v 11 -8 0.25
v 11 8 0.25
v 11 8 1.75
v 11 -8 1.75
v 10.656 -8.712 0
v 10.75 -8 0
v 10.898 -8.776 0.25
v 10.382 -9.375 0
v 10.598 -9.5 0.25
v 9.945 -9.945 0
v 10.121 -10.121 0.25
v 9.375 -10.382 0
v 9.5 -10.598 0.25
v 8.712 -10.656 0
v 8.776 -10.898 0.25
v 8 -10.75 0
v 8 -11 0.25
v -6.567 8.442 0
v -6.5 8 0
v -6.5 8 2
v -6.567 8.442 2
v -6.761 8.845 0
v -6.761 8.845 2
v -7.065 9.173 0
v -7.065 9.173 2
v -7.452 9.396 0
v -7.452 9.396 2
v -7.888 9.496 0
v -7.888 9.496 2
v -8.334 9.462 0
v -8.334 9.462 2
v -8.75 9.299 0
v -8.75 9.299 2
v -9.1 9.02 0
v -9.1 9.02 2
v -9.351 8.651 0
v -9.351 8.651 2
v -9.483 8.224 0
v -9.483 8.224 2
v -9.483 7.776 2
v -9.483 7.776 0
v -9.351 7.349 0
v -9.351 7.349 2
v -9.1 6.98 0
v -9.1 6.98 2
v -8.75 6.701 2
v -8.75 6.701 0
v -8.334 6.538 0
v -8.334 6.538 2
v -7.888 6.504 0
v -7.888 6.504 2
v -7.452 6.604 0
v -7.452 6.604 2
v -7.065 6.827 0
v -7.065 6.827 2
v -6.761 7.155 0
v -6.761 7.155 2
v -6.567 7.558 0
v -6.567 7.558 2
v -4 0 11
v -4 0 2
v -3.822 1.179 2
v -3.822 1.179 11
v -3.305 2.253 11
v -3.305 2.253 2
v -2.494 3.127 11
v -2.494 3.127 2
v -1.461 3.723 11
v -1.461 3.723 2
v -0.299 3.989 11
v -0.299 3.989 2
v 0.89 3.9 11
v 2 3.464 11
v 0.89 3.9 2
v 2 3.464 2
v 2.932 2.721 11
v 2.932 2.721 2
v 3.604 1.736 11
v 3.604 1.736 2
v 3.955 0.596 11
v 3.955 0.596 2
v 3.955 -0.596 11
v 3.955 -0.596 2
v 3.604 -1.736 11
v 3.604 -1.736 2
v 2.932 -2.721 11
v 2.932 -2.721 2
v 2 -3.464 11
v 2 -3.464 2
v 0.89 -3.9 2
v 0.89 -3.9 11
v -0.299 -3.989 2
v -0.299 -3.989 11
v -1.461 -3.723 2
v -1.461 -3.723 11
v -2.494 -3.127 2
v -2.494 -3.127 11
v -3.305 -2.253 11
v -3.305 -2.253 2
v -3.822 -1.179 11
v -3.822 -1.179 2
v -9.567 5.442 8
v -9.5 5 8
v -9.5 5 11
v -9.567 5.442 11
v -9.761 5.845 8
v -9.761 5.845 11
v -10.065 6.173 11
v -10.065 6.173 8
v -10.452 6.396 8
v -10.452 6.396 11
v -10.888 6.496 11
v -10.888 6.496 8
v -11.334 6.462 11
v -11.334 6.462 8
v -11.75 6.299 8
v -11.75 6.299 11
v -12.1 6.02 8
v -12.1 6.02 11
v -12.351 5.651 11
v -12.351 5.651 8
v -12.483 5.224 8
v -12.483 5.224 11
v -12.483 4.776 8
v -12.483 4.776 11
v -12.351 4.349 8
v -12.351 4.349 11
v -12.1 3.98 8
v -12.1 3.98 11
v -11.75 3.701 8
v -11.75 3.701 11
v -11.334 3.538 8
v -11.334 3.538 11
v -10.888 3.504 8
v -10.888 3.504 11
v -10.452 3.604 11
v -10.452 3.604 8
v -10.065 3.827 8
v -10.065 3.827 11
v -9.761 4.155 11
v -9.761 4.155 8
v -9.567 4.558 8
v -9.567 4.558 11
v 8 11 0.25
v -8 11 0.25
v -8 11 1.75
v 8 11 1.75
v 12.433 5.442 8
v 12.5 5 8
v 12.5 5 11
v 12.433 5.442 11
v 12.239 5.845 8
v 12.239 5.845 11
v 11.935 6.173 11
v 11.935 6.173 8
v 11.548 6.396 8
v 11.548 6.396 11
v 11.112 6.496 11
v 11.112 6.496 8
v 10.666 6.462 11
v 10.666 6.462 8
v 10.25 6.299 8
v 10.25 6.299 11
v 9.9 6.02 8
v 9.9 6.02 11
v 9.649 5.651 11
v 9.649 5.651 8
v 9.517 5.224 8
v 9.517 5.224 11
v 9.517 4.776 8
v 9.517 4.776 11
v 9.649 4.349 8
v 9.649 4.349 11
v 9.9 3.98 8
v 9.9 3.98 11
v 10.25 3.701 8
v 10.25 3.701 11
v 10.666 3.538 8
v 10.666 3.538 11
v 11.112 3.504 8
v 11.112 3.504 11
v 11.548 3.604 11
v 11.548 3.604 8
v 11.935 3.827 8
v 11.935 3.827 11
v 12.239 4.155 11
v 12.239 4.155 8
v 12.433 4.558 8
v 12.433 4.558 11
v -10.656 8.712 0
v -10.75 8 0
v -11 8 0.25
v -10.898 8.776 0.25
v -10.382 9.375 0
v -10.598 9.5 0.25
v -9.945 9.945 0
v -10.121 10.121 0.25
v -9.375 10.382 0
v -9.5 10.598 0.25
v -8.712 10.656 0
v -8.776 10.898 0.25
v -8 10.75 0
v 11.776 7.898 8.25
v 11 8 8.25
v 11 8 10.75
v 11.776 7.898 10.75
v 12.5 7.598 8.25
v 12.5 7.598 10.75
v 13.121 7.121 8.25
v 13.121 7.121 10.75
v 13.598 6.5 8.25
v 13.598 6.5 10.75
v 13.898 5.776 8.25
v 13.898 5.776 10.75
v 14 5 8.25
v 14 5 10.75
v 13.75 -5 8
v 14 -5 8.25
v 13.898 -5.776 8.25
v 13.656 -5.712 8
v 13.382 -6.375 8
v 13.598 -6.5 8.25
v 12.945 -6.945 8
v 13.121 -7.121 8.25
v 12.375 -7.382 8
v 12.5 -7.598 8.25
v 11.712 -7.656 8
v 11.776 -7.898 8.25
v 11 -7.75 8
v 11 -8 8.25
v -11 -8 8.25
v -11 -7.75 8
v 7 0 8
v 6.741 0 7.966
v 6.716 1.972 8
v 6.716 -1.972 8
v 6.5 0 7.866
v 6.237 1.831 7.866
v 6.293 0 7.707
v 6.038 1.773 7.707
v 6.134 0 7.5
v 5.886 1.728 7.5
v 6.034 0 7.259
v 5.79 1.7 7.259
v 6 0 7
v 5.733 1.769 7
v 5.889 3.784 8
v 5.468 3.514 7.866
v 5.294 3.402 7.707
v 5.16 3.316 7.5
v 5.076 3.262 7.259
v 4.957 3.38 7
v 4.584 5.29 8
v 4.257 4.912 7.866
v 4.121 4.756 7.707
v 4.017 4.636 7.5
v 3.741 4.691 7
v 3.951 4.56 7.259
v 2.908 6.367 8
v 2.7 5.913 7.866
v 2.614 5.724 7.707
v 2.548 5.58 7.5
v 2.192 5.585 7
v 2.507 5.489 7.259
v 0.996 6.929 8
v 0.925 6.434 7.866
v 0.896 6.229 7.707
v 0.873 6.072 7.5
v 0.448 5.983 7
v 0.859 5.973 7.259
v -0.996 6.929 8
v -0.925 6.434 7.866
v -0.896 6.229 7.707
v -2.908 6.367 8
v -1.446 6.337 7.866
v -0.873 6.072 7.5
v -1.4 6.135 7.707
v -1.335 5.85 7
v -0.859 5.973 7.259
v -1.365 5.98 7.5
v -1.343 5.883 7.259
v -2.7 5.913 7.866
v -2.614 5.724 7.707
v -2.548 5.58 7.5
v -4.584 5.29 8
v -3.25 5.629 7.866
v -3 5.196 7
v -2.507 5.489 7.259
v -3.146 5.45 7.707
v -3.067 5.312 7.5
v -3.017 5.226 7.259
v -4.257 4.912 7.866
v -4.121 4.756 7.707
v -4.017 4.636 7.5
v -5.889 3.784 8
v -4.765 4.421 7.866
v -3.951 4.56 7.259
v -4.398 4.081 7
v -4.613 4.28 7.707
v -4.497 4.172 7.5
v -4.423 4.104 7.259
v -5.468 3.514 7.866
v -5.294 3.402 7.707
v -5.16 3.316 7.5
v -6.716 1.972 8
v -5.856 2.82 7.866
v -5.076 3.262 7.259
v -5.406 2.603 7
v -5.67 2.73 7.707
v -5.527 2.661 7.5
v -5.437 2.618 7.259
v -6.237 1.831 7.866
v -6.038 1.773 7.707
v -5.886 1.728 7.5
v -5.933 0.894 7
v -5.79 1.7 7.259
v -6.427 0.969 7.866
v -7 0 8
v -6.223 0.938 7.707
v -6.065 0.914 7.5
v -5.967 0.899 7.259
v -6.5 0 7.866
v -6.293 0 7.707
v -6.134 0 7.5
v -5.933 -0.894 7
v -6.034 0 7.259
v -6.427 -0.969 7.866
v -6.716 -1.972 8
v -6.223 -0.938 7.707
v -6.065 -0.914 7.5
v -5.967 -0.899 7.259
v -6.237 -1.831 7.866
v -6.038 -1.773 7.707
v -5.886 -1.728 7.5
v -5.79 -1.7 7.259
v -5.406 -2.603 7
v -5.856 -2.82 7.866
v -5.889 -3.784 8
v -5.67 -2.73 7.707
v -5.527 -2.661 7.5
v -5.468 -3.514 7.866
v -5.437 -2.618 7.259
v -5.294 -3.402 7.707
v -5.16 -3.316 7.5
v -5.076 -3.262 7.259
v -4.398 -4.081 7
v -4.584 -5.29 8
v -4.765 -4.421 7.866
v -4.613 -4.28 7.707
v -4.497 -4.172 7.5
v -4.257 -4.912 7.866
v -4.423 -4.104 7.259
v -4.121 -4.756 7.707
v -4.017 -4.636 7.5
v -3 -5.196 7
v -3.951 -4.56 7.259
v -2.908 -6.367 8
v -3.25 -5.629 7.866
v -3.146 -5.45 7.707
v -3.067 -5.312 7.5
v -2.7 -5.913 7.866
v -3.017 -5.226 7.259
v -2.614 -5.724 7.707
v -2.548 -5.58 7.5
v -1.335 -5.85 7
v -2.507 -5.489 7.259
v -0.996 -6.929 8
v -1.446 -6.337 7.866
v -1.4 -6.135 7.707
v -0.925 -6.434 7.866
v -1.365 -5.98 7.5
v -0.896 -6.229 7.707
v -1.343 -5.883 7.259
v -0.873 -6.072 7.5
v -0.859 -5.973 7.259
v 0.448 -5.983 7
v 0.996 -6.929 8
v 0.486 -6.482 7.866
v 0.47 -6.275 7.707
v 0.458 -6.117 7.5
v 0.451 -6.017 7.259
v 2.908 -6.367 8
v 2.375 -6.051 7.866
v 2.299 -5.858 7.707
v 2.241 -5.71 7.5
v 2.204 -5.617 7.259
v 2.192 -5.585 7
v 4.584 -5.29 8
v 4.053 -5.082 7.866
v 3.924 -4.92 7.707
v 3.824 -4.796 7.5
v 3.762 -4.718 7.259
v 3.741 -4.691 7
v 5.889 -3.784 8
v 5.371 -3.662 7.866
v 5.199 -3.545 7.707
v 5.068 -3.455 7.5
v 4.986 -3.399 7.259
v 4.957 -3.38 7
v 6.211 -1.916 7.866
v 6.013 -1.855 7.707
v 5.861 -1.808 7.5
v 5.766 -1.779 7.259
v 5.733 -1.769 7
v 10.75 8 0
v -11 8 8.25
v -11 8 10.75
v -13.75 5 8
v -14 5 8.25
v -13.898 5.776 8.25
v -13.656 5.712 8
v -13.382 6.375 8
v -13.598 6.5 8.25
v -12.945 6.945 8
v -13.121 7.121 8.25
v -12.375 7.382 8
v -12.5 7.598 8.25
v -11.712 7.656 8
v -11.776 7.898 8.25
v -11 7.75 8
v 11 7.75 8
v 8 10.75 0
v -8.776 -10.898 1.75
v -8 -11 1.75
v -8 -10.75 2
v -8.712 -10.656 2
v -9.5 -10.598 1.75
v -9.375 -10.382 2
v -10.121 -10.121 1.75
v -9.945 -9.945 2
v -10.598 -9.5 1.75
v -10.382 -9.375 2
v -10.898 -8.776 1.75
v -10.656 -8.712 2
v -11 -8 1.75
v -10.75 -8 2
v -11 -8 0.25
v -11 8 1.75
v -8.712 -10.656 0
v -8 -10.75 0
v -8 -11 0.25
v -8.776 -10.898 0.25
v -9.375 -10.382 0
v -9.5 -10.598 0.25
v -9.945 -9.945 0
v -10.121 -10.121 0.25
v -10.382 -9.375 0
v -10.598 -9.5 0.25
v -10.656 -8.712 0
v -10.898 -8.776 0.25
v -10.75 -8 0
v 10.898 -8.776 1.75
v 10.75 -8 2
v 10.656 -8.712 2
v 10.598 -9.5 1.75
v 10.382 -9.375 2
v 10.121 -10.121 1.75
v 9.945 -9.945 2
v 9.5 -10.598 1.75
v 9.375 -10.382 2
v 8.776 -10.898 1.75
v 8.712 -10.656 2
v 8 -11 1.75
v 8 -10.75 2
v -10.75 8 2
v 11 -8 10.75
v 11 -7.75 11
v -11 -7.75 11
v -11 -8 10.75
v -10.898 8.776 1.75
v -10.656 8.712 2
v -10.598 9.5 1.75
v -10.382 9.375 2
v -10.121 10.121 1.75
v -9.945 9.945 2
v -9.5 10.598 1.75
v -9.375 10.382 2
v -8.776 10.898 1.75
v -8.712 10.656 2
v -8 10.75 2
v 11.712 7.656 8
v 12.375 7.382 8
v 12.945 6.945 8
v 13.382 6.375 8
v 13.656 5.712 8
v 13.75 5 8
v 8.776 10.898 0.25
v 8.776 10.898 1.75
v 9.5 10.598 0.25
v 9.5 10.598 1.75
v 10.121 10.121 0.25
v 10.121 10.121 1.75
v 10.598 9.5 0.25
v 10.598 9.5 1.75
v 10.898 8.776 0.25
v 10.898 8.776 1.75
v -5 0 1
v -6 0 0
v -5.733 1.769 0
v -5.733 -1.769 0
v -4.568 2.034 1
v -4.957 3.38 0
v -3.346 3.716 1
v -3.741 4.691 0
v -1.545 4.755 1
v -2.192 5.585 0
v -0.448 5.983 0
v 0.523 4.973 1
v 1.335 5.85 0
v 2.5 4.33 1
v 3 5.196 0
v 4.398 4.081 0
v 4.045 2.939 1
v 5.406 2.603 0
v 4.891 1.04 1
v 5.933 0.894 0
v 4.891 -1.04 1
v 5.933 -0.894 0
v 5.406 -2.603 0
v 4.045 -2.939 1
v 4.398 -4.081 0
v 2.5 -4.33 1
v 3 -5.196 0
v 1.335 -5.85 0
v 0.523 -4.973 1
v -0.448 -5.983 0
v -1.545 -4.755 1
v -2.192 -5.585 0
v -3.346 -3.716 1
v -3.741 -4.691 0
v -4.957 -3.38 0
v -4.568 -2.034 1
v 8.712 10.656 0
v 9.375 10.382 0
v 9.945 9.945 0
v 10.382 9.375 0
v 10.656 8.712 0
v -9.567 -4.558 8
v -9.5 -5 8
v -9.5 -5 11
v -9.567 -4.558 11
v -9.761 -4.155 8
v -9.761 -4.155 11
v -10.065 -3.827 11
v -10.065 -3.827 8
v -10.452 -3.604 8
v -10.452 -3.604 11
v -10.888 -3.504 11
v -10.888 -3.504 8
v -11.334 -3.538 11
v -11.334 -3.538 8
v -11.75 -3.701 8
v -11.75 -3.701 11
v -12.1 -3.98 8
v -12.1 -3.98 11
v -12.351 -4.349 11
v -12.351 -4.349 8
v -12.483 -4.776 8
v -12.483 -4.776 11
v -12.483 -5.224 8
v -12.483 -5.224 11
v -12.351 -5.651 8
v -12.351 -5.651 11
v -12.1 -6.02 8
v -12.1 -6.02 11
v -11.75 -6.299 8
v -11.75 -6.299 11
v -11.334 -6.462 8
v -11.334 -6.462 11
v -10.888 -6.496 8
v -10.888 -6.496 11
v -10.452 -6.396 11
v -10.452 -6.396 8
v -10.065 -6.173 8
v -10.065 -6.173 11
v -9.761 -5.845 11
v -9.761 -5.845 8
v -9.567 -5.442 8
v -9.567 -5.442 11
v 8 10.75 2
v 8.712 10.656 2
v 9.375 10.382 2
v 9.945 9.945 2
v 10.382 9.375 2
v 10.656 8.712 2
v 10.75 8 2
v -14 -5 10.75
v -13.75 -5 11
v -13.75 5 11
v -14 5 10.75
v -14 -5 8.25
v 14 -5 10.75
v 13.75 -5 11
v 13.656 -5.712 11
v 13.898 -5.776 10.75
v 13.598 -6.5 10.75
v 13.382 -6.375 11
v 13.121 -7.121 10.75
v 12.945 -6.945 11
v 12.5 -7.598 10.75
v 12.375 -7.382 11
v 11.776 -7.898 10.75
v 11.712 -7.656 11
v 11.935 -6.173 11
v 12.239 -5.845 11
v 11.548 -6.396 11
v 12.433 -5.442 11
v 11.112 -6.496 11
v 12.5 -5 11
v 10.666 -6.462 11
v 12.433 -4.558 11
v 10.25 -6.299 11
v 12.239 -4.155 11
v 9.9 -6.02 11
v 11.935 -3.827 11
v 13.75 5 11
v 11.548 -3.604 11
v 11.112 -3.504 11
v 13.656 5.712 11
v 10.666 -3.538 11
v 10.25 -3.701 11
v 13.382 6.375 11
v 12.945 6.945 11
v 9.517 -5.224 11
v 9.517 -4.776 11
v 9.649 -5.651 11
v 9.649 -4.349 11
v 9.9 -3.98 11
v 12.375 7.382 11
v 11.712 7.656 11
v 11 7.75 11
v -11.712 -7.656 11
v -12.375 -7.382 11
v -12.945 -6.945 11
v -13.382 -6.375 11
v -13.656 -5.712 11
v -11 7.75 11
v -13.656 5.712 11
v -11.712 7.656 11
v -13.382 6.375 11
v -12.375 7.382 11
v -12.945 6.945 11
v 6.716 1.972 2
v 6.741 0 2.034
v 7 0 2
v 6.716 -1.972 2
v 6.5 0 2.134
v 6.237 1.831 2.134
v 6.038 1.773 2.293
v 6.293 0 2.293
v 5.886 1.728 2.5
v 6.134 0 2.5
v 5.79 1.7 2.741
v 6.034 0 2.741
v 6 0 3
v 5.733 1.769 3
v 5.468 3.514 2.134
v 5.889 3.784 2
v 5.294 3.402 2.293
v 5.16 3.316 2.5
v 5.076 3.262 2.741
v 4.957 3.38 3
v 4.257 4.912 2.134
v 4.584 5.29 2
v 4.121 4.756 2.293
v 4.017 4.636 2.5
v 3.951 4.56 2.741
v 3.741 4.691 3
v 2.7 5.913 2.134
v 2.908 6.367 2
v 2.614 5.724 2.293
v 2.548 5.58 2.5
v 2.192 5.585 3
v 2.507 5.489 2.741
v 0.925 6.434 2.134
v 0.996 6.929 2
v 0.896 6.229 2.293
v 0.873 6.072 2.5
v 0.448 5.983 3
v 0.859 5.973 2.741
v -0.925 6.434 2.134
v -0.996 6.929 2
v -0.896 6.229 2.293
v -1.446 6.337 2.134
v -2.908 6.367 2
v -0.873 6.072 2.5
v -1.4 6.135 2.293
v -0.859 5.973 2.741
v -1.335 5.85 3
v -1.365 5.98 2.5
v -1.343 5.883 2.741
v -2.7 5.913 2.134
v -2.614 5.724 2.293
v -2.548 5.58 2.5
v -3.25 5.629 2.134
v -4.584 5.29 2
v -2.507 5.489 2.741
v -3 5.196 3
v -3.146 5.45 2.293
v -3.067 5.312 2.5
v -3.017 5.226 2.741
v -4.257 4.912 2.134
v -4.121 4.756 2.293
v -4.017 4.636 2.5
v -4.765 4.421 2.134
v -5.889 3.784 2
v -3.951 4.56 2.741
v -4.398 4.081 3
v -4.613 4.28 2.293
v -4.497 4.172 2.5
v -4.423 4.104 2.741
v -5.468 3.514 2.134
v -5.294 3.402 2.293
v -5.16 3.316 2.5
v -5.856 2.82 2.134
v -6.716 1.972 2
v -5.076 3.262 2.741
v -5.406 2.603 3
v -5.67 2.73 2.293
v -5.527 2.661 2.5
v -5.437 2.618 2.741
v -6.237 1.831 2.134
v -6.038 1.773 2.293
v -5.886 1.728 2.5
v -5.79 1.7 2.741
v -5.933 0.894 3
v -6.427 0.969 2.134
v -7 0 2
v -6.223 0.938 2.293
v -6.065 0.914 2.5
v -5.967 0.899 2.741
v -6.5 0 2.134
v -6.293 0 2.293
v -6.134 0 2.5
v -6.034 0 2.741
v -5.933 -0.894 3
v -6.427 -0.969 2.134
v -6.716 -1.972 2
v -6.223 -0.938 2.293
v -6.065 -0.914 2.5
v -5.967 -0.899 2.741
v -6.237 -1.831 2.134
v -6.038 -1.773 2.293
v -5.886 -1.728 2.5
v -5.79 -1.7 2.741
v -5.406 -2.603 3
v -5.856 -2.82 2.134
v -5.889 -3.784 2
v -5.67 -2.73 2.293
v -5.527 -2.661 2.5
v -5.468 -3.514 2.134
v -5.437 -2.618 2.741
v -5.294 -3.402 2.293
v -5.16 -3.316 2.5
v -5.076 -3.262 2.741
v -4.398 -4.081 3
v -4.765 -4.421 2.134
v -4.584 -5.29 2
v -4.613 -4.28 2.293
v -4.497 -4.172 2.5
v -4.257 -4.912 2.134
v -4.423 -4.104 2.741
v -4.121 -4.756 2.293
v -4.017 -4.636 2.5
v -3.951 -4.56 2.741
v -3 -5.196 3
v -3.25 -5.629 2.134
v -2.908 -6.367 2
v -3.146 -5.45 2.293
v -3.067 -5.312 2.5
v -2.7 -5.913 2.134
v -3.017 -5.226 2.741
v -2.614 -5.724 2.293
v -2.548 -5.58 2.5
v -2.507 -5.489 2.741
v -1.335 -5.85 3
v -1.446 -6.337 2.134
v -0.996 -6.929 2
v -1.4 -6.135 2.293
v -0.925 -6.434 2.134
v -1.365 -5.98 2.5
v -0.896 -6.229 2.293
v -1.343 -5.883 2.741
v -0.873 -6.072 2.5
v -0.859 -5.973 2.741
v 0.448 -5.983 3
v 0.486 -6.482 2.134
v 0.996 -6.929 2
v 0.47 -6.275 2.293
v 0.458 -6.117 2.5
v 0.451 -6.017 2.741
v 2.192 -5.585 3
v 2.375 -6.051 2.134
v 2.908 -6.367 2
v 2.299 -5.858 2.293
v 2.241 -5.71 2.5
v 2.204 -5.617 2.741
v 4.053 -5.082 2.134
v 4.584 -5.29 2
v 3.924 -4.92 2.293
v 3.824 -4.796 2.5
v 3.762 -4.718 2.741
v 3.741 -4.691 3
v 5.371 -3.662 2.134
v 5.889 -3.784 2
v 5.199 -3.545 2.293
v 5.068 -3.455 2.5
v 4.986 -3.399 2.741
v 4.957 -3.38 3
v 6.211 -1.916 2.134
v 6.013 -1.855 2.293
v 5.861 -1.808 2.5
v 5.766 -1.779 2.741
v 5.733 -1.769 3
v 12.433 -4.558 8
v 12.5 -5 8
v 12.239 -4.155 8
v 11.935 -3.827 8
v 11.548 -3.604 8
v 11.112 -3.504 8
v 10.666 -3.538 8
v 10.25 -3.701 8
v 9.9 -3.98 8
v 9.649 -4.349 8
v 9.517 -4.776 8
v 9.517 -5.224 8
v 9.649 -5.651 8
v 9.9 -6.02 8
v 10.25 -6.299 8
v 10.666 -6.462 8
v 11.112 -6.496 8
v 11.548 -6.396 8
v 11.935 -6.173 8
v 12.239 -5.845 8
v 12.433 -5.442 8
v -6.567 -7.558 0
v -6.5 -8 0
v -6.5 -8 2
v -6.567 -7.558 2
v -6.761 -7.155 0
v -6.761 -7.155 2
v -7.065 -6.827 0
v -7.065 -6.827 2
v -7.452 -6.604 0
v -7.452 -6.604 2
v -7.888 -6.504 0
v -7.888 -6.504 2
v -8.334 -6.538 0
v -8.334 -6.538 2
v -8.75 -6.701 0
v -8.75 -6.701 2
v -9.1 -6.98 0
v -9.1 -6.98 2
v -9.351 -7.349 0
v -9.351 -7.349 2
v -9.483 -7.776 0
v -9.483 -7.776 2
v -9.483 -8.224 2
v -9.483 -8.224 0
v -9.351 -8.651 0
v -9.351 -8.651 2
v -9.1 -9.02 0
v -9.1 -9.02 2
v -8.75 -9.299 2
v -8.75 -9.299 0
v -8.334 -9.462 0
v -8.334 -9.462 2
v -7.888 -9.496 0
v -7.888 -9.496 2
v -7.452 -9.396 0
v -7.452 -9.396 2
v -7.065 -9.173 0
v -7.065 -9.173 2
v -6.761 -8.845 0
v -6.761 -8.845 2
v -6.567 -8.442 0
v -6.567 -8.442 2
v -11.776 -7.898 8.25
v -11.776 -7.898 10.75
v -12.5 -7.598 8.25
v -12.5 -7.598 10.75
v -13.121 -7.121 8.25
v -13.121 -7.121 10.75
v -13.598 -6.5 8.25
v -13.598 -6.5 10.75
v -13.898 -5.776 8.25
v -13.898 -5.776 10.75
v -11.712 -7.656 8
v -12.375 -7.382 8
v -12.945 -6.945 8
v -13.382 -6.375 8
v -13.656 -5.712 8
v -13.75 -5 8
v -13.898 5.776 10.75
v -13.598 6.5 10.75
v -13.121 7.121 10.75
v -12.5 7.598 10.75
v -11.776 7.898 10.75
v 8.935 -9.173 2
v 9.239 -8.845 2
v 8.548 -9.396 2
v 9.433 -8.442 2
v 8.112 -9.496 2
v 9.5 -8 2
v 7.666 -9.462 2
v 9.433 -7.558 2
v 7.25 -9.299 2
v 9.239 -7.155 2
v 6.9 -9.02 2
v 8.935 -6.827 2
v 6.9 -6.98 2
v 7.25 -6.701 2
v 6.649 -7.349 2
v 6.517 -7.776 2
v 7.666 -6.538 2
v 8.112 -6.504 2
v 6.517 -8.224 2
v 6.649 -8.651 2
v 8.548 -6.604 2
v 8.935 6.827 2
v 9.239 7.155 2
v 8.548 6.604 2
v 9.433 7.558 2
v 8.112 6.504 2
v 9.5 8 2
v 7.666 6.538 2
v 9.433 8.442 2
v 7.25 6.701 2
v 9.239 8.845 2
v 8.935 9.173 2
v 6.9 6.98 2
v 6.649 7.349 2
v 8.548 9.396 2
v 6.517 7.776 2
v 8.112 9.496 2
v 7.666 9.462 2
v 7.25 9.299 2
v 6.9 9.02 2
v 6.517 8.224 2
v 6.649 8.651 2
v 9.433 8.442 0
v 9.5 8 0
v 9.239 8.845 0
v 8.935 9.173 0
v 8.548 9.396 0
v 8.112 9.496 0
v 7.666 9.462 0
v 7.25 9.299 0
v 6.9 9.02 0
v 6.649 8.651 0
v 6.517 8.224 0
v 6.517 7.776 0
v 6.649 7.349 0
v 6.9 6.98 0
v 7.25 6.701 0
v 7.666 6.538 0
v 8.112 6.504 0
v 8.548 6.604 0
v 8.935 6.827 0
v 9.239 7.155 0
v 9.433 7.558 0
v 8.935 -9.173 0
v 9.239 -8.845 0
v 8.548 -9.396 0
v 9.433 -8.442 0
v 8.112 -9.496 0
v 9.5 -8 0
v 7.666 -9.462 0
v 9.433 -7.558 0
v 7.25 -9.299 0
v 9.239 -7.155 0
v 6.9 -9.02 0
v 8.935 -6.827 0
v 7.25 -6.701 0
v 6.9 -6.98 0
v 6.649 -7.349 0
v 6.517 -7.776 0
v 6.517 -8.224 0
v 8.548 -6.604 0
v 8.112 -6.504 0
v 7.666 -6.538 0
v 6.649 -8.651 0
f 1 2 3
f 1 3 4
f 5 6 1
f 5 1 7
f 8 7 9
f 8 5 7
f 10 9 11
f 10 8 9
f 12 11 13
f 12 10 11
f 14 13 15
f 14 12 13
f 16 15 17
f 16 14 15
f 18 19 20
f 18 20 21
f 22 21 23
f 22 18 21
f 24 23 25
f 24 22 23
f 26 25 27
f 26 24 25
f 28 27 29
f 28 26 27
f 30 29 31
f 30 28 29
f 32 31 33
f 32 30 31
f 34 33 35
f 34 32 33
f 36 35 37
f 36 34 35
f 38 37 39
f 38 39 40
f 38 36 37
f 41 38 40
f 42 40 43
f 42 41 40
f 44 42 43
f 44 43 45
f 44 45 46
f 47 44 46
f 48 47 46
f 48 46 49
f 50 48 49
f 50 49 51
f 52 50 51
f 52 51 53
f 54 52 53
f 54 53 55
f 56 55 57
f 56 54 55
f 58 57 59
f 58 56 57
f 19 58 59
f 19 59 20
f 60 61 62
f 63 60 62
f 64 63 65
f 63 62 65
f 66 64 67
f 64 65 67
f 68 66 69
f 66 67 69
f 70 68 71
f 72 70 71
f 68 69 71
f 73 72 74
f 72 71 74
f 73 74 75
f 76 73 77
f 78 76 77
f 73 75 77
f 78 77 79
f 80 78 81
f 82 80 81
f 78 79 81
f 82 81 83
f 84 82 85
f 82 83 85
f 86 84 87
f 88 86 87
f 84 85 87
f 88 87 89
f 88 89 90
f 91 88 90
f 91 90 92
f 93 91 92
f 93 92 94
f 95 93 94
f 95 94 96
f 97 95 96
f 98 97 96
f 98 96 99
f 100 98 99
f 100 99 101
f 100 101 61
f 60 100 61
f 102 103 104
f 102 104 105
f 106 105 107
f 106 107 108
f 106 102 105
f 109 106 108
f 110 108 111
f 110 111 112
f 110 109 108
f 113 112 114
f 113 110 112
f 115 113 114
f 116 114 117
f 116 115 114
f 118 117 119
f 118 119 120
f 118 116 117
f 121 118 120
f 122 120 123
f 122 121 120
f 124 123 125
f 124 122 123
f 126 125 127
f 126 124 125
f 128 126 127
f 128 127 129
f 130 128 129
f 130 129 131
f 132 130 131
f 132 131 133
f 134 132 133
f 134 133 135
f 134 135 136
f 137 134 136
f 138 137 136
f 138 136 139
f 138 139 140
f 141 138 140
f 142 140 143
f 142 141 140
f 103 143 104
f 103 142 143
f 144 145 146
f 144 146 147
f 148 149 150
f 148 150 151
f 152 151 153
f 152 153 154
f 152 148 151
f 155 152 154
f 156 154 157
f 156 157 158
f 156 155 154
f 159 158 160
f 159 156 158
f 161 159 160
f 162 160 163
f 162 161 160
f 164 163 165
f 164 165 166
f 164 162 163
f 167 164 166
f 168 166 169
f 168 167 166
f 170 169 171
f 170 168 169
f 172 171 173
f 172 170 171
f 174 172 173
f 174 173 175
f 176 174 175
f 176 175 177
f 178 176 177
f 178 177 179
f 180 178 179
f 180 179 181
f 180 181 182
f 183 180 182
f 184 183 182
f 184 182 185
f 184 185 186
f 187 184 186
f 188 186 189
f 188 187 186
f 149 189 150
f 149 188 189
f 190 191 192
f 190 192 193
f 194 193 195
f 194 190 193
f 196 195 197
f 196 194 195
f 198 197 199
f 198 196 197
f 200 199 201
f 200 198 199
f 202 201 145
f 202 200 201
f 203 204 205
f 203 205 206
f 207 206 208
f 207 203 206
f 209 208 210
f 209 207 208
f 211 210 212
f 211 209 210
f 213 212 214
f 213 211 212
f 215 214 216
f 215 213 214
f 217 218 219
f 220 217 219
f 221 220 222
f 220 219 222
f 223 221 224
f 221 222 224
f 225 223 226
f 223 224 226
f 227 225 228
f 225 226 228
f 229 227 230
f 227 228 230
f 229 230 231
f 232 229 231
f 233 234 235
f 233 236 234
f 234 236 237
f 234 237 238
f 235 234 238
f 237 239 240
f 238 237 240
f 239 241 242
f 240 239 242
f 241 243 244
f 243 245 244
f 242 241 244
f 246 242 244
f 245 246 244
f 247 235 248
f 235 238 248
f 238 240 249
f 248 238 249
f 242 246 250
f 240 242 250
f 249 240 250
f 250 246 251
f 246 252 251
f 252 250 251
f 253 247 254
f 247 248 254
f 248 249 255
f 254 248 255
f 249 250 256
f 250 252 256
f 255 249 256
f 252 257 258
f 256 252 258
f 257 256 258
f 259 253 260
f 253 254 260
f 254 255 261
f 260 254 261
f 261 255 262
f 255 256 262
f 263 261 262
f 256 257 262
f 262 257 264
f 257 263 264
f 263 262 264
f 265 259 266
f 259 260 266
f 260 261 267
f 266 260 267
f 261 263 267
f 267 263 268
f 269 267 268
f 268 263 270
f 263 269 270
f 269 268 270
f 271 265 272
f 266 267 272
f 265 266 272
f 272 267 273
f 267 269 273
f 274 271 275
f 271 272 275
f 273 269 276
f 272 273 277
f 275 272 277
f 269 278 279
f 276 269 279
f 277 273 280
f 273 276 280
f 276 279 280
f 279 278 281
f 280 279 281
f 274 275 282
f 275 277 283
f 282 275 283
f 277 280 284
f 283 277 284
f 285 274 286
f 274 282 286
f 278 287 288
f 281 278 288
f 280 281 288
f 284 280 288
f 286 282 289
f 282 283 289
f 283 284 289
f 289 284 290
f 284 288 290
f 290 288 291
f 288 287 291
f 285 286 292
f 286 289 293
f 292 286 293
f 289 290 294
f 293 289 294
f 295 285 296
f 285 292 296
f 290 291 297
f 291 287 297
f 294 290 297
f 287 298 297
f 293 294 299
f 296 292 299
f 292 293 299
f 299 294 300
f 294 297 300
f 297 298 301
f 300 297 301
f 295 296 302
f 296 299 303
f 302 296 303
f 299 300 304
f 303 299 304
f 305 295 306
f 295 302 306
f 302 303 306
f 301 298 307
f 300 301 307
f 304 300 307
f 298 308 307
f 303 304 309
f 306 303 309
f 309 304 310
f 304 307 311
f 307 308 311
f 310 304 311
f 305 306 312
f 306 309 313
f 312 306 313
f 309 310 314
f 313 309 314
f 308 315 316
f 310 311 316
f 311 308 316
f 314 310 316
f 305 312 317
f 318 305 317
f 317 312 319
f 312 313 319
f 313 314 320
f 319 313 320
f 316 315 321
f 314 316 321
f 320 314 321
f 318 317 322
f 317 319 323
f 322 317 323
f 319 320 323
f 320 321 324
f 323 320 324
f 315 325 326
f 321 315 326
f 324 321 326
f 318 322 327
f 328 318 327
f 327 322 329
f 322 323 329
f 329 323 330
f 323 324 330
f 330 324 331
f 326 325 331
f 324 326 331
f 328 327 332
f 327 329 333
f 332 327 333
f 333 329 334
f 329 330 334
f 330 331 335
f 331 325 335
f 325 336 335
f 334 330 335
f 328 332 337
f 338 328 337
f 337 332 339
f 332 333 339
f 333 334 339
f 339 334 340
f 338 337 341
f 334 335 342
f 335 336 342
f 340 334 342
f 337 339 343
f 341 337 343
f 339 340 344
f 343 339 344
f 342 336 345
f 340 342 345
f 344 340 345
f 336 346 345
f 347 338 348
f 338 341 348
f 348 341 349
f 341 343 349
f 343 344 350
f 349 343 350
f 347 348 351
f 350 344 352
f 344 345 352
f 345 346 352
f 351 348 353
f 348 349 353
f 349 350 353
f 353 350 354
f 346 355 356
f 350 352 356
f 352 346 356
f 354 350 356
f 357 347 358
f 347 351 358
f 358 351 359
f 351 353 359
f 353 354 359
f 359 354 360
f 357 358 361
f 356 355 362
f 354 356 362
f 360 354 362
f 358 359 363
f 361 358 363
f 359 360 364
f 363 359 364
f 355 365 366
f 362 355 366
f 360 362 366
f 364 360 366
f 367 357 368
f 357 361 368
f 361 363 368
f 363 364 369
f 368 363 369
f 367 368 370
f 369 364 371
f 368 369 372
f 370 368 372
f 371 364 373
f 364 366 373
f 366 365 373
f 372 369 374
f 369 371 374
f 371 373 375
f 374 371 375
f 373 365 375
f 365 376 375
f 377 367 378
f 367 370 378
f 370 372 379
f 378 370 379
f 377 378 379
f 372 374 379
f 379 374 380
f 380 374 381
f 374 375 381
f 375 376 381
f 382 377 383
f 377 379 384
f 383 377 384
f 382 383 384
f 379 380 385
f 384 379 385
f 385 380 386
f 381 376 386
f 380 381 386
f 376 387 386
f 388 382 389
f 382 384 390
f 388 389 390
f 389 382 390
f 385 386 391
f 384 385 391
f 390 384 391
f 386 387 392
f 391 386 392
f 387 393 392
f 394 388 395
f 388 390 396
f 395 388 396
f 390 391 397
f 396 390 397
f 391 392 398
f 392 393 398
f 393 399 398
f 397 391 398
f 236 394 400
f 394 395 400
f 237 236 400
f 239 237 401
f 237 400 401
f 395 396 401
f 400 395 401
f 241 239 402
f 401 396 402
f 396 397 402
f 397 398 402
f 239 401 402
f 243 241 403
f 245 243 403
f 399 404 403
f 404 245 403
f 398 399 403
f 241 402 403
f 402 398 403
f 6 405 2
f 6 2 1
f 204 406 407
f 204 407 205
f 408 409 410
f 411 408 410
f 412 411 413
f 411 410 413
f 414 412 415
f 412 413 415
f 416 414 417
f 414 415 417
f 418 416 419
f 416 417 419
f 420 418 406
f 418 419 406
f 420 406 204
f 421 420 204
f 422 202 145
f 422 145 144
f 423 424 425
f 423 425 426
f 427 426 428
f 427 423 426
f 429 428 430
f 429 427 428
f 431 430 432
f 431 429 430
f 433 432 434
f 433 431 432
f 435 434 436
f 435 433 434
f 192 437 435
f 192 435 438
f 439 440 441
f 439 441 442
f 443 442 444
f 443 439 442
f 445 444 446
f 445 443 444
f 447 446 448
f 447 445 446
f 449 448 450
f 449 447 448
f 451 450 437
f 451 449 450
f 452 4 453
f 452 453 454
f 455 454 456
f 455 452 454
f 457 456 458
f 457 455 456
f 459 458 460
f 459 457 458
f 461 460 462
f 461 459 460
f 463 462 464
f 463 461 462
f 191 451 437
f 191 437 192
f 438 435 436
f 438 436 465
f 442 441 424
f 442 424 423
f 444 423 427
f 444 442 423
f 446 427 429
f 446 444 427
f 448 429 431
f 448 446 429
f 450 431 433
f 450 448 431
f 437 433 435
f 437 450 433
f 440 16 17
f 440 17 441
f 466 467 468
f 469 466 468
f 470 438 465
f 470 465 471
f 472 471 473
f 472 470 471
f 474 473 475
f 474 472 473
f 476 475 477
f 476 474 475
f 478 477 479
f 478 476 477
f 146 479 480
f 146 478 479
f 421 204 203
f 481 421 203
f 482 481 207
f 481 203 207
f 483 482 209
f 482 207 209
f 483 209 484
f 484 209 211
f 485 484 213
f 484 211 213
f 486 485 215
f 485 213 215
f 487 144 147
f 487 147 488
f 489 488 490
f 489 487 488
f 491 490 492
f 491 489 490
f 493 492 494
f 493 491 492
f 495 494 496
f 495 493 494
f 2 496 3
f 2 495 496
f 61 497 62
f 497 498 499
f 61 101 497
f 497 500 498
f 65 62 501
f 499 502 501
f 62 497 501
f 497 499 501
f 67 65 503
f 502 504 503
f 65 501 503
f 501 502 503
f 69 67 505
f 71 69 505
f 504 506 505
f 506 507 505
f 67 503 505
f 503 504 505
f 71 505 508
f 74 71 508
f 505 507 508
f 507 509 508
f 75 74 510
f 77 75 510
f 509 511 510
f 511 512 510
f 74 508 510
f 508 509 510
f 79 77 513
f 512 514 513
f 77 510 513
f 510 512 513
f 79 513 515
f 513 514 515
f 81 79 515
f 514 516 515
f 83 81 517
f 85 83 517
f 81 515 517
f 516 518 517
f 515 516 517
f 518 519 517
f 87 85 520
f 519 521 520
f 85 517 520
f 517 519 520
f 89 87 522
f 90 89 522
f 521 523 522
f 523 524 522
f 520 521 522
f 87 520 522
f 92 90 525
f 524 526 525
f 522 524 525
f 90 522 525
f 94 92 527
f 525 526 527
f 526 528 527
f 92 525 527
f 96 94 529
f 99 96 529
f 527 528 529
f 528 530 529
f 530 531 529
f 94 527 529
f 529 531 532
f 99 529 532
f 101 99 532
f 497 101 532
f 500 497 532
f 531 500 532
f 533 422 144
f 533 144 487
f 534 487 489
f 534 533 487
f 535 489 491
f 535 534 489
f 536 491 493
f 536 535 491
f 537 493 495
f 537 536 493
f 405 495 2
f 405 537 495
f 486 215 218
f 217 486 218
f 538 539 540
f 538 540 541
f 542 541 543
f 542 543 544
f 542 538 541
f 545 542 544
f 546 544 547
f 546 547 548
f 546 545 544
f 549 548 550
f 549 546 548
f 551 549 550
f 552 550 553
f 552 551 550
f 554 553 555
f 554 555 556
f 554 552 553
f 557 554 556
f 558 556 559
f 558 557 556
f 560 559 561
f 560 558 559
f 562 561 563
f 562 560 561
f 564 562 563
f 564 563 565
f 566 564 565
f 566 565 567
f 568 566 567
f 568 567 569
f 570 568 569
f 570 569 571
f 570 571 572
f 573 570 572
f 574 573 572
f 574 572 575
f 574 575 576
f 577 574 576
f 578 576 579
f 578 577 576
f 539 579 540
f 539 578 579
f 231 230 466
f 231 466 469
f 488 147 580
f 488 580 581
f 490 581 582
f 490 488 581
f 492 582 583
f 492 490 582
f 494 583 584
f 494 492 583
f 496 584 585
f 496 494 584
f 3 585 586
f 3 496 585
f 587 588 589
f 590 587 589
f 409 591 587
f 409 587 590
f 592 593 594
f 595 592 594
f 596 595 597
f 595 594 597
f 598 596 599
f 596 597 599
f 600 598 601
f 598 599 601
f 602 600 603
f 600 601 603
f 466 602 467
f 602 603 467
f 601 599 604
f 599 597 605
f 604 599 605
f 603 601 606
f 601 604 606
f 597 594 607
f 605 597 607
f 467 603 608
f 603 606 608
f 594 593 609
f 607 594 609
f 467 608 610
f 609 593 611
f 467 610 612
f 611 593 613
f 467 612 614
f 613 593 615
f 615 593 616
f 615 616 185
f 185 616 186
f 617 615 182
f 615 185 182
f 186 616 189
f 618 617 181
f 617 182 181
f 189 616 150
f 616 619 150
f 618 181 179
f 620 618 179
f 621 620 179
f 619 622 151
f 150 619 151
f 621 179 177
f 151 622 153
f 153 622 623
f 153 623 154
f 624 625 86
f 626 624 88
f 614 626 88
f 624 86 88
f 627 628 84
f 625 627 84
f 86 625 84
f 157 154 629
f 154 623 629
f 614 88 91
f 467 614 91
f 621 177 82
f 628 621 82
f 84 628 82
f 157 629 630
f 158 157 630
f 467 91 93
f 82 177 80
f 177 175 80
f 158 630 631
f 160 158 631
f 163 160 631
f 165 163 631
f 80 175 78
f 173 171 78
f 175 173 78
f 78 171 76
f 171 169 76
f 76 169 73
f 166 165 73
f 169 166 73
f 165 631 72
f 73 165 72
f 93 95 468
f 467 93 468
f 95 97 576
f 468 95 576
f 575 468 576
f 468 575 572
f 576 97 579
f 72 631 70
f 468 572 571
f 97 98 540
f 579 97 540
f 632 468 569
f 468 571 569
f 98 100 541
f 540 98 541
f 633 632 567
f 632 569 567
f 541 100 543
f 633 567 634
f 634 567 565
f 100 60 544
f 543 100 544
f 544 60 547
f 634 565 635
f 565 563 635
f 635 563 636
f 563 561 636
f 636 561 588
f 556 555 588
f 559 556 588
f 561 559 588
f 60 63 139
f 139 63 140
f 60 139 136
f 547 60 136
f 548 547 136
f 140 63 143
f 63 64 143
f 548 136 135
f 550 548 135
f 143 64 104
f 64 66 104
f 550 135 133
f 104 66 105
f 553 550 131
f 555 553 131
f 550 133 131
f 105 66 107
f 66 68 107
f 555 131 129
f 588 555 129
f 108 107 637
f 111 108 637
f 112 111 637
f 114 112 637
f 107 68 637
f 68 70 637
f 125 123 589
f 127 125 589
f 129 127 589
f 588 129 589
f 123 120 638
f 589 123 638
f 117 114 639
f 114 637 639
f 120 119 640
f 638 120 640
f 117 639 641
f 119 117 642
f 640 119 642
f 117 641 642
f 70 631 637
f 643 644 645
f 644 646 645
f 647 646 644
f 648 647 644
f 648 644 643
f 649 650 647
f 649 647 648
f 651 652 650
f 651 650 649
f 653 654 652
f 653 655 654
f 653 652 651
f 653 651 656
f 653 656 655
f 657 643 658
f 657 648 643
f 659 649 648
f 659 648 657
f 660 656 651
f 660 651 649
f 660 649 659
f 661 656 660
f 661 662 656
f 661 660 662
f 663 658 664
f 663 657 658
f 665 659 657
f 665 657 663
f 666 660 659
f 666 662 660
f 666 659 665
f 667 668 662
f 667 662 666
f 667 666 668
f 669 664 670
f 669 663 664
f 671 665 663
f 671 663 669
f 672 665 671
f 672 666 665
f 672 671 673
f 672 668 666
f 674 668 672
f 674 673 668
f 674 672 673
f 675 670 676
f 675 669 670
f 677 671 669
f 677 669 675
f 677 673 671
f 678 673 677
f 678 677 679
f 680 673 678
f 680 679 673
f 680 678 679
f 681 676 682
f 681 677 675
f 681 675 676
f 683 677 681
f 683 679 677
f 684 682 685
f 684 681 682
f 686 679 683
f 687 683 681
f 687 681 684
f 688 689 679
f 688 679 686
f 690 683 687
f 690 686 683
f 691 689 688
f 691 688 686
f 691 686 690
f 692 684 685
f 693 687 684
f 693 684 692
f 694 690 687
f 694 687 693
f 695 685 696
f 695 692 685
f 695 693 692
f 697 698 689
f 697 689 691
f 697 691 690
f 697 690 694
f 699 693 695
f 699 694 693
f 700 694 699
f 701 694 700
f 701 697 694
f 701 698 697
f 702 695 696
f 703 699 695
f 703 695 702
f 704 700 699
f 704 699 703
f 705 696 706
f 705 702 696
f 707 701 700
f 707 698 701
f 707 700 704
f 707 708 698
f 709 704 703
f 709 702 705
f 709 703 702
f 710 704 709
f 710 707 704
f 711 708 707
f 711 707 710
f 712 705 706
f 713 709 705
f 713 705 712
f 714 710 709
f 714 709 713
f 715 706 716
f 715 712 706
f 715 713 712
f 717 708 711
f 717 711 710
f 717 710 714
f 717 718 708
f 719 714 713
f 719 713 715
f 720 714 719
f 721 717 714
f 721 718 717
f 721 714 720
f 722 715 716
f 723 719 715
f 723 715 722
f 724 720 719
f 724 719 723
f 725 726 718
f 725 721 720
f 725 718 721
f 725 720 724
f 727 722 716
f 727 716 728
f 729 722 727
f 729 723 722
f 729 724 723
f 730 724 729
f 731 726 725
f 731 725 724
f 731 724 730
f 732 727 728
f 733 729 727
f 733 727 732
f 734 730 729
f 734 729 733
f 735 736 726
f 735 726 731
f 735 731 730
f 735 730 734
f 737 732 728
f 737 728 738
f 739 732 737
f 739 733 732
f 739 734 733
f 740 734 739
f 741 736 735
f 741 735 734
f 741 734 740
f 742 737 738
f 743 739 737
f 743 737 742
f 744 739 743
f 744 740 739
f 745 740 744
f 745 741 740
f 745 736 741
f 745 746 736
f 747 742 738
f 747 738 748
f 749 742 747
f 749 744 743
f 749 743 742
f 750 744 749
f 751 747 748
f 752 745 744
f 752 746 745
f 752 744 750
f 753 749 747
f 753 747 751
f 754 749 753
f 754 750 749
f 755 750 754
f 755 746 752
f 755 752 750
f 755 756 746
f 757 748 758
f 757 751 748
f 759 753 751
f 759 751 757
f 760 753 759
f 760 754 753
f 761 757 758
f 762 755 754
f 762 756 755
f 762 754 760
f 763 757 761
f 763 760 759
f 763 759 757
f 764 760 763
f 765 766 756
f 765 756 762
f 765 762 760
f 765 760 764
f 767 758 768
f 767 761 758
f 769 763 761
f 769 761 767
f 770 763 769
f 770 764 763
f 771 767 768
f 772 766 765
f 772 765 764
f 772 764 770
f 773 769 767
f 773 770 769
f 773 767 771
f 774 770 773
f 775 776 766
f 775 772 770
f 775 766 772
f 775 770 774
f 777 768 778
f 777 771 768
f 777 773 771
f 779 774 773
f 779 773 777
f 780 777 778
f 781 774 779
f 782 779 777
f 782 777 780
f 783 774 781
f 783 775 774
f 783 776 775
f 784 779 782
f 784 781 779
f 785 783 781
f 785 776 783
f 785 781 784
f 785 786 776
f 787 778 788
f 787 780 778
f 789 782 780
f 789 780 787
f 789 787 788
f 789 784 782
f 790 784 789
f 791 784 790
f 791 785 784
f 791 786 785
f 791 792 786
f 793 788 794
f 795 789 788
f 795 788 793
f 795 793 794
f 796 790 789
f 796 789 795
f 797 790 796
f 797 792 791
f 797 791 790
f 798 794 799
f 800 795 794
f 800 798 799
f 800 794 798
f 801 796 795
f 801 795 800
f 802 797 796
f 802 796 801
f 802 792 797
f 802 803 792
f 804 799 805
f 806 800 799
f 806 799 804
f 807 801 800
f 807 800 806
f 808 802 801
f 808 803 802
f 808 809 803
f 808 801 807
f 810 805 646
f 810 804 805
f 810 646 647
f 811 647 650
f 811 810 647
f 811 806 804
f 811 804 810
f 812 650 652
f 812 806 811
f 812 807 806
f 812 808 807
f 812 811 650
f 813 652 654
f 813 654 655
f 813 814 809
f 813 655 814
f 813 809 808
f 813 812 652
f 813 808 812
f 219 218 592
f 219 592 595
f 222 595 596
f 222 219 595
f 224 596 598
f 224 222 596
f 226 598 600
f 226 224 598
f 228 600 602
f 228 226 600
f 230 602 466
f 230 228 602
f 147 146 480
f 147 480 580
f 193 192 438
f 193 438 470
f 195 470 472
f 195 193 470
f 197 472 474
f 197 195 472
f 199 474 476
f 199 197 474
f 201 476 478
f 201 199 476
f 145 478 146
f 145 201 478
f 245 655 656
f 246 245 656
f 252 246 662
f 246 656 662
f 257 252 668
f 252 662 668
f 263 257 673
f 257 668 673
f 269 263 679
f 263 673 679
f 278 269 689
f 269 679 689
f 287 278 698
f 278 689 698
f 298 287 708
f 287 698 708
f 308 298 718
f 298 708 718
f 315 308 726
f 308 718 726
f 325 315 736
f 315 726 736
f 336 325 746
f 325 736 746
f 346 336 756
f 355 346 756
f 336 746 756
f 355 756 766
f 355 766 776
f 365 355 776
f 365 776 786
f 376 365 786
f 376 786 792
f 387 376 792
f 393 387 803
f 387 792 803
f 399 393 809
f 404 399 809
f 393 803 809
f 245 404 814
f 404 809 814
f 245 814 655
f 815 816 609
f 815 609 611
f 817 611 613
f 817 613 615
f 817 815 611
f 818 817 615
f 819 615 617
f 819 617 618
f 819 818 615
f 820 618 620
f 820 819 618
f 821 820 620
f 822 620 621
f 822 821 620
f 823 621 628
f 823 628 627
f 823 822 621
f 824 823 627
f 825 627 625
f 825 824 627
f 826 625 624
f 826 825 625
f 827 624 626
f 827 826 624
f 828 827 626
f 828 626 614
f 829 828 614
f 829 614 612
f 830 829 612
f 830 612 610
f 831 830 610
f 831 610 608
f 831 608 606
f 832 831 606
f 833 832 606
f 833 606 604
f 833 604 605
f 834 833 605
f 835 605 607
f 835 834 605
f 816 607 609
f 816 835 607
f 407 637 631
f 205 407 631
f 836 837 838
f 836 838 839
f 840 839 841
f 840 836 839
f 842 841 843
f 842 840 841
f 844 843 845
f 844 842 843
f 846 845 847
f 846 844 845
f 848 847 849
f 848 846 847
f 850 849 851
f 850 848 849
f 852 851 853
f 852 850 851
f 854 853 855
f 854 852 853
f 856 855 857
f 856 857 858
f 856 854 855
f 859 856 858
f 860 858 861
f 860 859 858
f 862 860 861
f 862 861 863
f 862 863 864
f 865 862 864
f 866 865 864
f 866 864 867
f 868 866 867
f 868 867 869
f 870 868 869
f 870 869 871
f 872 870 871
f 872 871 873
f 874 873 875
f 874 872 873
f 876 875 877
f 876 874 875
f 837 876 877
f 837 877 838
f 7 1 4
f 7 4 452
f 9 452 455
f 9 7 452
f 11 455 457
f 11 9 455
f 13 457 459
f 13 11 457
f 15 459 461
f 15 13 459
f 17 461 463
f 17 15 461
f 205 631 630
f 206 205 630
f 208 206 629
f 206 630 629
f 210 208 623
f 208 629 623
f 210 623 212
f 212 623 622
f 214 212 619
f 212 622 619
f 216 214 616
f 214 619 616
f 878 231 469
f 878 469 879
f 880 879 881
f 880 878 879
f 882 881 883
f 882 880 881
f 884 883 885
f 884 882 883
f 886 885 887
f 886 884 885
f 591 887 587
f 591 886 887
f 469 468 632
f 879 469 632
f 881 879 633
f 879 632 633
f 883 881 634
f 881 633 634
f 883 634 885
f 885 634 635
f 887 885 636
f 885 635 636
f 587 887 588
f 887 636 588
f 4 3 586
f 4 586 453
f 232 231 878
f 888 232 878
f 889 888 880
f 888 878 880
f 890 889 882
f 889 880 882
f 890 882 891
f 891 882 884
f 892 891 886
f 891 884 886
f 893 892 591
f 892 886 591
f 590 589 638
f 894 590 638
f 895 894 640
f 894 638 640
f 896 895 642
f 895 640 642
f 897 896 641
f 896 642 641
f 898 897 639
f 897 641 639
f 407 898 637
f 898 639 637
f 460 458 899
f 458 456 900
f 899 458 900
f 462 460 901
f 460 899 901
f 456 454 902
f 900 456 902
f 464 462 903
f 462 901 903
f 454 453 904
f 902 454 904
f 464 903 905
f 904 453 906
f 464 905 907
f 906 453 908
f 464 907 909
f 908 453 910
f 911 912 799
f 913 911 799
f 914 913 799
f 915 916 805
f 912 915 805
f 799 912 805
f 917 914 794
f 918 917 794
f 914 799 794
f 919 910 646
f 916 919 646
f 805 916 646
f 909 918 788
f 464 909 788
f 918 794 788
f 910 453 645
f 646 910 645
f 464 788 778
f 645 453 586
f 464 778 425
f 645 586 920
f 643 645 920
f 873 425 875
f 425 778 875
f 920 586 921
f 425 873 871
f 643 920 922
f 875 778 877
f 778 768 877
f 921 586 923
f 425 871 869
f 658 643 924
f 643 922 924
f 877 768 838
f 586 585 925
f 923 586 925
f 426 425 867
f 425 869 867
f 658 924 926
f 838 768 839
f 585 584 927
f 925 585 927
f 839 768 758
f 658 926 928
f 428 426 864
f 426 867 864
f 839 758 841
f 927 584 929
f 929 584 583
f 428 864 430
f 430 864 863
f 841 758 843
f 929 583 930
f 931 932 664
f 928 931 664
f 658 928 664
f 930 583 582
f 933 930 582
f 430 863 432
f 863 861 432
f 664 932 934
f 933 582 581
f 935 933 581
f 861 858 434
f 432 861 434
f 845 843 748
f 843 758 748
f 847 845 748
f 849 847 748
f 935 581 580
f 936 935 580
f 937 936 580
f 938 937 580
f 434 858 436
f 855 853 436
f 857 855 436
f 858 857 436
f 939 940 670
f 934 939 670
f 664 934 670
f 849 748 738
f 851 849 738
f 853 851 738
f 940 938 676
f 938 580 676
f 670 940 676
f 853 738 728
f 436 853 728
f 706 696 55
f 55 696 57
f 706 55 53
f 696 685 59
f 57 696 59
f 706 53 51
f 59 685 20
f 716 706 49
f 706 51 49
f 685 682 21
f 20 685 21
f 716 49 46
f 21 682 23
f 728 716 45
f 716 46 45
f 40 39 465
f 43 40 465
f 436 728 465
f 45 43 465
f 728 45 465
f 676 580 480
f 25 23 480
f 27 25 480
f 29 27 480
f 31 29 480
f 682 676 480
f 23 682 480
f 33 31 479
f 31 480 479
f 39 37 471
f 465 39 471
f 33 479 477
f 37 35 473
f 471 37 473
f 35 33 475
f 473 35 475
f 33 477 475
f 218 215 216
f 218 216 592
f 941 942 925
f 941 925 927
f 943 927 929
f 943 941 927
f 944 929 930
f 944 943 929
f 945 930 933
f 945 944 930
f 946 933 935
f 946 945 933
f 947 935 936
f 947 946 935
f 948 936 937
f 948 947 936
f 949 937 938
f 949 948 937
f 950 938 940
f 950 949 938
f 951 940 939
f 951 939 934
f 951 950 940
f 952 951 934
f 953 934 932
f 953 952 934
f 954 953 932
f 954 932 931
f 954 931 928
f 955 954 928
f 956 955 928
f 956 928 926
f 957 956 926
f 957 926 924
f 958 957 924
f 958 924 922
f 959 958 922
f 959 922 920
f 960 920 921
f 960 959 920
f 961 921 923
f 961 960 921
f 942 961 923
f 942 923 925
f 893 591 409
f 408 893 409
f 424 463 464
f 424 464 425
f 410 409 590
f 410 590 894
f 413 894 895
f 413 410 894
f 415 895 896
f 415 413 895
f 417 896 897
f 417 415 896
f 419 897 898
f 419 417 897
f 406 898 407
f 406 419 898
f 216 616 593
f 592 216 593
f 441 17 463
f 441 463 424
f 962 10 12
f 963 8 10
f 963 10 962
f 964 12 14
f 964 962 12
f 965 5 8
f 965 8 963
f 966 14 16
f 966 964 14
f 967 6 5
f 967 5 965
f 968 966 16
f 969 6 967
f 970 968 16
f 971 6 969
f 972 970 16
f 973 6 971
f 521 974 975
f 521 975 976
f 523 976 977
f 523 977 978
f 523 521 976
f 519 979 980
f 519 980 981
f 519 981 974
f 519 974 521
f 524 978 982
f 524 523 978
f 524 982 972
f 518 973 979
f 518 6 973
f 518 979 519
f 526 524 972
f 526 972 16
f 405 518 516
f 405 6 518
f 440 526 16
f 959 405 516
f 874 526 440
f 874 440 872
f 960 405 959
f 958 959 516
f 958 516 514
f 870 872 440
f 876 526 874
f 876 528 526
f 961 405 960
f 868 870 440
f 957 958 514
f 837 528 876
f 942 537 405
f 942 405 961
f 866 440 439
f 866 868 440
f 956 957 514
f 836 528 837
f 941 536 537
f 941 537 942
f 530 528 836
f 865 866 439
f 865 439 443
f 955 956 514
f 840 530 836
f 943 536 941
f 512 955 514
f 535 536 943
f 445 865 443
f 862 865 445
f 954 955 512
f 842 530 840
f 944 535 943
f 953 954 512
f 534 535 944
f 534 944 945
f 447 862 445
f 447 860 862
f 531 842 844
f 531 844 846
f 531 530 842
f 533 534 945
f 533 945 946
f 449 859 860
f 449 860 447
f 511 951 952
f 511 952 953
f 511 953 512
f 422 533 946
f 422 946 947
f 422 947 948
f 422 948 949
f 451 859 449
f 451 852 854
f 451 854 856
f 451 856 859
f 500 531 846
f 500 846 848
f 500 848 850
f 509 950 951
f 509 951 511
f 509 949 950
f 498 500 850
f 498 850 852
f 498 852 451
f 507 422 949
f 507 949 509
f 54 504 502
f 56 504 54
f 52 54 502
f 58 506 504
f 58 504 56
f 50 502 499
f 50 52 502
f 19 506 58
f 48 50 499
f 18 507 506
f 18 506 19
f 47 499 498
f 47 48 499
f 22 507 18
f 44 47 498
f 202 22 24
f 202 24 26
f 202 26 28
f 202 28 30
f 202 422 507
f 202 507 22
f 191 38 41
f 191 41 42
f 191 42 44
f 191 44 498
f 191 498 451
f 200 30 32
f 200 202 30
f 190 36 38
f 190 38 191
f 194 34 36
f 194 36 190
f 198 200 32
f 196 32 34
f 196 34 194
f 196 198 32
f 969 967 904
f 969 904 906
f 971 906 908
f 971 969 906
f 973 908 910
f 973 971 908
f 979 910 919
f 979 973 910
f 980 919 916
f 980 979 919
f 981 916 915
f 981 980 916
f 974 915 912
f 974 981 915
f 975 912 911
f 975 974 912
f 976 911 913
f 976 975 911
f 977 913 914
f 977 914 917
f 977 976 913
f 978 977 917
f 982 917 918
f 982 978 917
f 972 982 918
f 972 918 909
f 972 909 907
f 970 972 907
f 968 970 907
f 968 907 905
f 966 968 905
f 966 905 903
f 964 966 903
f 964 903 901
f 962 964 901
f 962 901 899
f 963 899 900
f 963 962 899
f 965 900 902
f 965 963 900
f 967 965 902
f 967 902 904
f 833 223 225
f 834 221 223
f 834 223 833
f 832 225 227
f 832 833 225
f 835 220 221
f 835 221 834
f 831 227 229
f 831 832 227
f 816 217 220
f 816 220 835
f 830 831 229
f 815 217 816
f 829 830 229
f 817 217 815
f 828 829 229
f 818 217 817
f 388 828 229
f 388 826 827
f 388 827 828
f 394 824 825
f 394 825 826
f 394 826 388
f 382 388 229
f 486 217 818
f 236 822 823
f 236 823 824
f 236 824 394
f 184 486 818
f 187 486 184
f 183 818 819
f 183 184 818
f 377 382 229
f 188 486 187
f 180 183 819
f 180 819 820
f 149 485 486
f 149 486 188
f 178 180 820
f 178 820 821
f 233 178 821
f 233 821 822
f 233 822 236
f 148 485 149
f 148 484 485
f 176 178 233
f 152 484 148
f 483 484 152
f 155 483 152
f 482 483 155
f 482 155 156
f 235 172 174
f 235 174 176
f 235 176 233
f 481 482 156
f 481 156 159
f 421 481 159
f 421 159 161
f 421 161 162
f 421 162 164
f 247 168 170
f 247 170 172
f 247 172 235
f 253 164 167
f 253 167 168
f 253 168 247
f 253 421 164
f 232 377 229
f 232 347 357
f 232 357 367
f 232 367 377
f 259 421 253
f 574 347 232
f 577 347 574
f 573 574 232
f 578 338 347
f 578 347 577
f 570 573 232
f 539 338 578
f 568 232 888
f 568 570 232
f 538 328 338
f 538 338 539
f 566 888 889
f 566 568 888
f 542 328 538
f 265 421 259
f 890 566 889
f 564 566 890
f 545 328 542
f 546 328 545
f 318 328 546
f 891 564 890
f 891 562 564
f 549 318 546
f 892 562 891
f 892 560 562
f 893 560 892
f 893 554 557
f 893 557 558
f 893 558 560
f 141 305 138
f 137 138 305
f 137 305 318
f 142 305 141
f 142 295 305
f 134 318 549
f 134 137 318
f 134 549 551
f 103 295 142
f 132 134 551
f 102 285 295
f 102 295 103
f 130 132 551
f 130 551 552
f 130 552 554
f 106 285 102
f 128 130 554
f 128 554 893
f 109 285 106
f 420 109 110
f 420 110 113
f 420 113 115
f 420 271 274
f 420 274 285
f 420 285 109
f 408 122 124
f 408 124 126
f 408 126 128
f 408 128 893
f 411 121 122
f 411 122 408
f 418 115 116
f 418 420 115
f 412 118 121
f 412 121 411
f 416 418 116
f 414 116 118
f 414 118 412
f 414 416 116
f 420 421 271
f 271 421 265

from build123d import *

# Parameters (mm, degrees)
SKETCH1_R           = 1.5
BOSS_EXTRUDE1_DEPTH = 2
SKETCH2_R           = 6
BOSS_EXTRUDE2_DEPTH = 6
SKETCH3_R           = 1.5
BOSS_EXTRUDE3_DEPTH = 3
SKETCH4_R           = 4
CUT_EXTRUDE1_DEPTH  = 21.928449536
CHAMFER1_SIZE       = 2
FILLET1_R           = 1
CHAMFER2_SIZE       = 0.25


with BuildPart() as part:
    # Sketch1 → Boss-Extrude1 (new body)
    with BuildSketch(Plane.XY):
        with BuildLine():
            Line((8, -11), (-8, -11))
            ThreePointArc((-8, -11), (-10.121320344, -10.121320344), (-11, -8))
            Line((-11, -8), (-11, 8))
            ThreePointArc((-11, 8), (-10.121320344, 10.121320344), (-8, 11))
            Line((-8, 11), (8, 11))
            ThreePointArc((8, 11), (10.121320344, 10.121320344), (11, 8))
            Line((11, 8), (11, -8))
            ThreePointArc((11, -8), (10.121320344, -10.121320344), (8, -11))
        make_face()
        with Locations((-8, 8)):
            Circle(SKETCH1_R, mode=Mode.SUBTRACT)
        with Locations((8, 8)):
            Circle(SKETCH1_R, mode=Mode.SUBTRACT)
        with Locations((8, -8)):
            Circle(SKETCH1_R, mode=Mode.SUBTRACT)
        with Locations((-8, -8)):
            Circle(SKETCH1_R, mode=Mode.SUBTRACT)
    extrude(amount=BOSS_EXTRUDE1_DEPTH)

    # Sketch2 → Boss-Extrude2 (add)
    with BuildSketch(Plane.XY.offset(2)):
        Circle(SKETCH2_R)
    extrude(amount=BOSS_EXTRUDE2_DEPTH)

    # Sketch3 → Boss-Extrude3 (add)
    with BuildSketch(Plane.XY.offset(8)):
        with BuildLine():
            Line((11, -8), (-11, -8))
            ThreePointArc((-11, -8), (-13.121320344, -7.121320344), (-14, -5))
            Line((-14, -5), (-14, 5))
            ThreePointArc((-14, 5), (-13.121320344, 7.121320344), (-11, 8))
            Line((-11, 8), (11, 8))
            ThreePointArc((11, 8), (13.121320344, 7.121320344), (14, 5))
            Line((14, 5), (14, -5))
            ThreePointArc((14, -5), (13.121320344, -7.121320344), (11, -8))
        make_face()
        with Locations((-11, 5)):
            Circle(SKETCH3_R, mode=Mode.SUBTRACT)
        with Locations((11, 5)):
            Circle(SKETCH3_R, mode=Mode.SUBTRACT)
        with Locations((11, -5)):
            Circle(SKETCH3_R, mode=Mode.SUBTRACT)
        with Locations((-11, -5)):
            Circle(SKETCH3_R, mode=Mode.SUBTRACT)
    extrude(amount=BOSS_EXTRUDE3_DEPTH)

    # Sketch4 → Cut-Extrude1 (cut, through all)
    with BuildSketch(Plane(origin=(0, 0, 0), x_dir=(-1, 0, 0), z_dir=(0, 0, -1))):
        Circle(SKETCH4_R)
    extrude(amount=-CUT_EXTRUDE1_DEPTH, mode=Mode.SUBTRACT)

    # Chamfer1
    chamfer1_edges = [part.edges().sort_by_distance(p)[0] for p in [
        (4, 0, 0),
    ]]
    chamfer(chamfer1_edges, length=CHAMFER1_SIZE)

    # Fillet1
    fillet1_edges = [part.edges().sort_by_distance(p)[0] for p in [
        (-6, 0, 2),
        (-6, 0, 8),
    ]]
    fillet(fillet1_edges, radius=FILLET1_R)

    # Chamfer2
    chamfer2_edges = [part.edges().sort_by_distance(p)[0] for p in [
        (-11, 0, 0),
        (-10.121320344, 10.121320344, 0),
        (0, 11, 0),
        (10.121320344, 10.121320344, 0),
        (-10.121320344, 10.121320344, 2),
        (-11, 0, 2),
        (-10.121320344, -10.121320344, 2),
        (0, -11, 2),
        (10.121320344, -10.121320344, 2),
        (11, 0, 2),
        (-13.121320344, -7.121320344, 11),
        (0, -8, 11),
        (13.121320344, -7.121320344, 11),
        (14, 0, 11),
        (13.121320344, 7.121320344, 11),
        (0, 8, 11),
        (-13.121320344, 7.121320344, 11),
        (-14, 0, 11),
        (10.121320344, 10.121320344, 2),
        (-13.121320344, -7.121320344, 8),
        (0, -8, 8),
        (13.121320344, -7.121320344, 8),
        (14, 0, 8),
        (13.121320344, 7.121320344, 8),
        (0, 8, 8),
        (-13.121320344, 7.121320344, 8),
        (-14, 0, 8),
        (11, 0, 0),
        (0, 11, 2),
        (10.121320344, -10.121320344, 0),
        (0, -11, 0),
        (-10.121320344, -10.121320344, 0),
    ]]
    chamfer(chamfer2_edges, length=CHAMFER2_SIZE)


solid = part.part
